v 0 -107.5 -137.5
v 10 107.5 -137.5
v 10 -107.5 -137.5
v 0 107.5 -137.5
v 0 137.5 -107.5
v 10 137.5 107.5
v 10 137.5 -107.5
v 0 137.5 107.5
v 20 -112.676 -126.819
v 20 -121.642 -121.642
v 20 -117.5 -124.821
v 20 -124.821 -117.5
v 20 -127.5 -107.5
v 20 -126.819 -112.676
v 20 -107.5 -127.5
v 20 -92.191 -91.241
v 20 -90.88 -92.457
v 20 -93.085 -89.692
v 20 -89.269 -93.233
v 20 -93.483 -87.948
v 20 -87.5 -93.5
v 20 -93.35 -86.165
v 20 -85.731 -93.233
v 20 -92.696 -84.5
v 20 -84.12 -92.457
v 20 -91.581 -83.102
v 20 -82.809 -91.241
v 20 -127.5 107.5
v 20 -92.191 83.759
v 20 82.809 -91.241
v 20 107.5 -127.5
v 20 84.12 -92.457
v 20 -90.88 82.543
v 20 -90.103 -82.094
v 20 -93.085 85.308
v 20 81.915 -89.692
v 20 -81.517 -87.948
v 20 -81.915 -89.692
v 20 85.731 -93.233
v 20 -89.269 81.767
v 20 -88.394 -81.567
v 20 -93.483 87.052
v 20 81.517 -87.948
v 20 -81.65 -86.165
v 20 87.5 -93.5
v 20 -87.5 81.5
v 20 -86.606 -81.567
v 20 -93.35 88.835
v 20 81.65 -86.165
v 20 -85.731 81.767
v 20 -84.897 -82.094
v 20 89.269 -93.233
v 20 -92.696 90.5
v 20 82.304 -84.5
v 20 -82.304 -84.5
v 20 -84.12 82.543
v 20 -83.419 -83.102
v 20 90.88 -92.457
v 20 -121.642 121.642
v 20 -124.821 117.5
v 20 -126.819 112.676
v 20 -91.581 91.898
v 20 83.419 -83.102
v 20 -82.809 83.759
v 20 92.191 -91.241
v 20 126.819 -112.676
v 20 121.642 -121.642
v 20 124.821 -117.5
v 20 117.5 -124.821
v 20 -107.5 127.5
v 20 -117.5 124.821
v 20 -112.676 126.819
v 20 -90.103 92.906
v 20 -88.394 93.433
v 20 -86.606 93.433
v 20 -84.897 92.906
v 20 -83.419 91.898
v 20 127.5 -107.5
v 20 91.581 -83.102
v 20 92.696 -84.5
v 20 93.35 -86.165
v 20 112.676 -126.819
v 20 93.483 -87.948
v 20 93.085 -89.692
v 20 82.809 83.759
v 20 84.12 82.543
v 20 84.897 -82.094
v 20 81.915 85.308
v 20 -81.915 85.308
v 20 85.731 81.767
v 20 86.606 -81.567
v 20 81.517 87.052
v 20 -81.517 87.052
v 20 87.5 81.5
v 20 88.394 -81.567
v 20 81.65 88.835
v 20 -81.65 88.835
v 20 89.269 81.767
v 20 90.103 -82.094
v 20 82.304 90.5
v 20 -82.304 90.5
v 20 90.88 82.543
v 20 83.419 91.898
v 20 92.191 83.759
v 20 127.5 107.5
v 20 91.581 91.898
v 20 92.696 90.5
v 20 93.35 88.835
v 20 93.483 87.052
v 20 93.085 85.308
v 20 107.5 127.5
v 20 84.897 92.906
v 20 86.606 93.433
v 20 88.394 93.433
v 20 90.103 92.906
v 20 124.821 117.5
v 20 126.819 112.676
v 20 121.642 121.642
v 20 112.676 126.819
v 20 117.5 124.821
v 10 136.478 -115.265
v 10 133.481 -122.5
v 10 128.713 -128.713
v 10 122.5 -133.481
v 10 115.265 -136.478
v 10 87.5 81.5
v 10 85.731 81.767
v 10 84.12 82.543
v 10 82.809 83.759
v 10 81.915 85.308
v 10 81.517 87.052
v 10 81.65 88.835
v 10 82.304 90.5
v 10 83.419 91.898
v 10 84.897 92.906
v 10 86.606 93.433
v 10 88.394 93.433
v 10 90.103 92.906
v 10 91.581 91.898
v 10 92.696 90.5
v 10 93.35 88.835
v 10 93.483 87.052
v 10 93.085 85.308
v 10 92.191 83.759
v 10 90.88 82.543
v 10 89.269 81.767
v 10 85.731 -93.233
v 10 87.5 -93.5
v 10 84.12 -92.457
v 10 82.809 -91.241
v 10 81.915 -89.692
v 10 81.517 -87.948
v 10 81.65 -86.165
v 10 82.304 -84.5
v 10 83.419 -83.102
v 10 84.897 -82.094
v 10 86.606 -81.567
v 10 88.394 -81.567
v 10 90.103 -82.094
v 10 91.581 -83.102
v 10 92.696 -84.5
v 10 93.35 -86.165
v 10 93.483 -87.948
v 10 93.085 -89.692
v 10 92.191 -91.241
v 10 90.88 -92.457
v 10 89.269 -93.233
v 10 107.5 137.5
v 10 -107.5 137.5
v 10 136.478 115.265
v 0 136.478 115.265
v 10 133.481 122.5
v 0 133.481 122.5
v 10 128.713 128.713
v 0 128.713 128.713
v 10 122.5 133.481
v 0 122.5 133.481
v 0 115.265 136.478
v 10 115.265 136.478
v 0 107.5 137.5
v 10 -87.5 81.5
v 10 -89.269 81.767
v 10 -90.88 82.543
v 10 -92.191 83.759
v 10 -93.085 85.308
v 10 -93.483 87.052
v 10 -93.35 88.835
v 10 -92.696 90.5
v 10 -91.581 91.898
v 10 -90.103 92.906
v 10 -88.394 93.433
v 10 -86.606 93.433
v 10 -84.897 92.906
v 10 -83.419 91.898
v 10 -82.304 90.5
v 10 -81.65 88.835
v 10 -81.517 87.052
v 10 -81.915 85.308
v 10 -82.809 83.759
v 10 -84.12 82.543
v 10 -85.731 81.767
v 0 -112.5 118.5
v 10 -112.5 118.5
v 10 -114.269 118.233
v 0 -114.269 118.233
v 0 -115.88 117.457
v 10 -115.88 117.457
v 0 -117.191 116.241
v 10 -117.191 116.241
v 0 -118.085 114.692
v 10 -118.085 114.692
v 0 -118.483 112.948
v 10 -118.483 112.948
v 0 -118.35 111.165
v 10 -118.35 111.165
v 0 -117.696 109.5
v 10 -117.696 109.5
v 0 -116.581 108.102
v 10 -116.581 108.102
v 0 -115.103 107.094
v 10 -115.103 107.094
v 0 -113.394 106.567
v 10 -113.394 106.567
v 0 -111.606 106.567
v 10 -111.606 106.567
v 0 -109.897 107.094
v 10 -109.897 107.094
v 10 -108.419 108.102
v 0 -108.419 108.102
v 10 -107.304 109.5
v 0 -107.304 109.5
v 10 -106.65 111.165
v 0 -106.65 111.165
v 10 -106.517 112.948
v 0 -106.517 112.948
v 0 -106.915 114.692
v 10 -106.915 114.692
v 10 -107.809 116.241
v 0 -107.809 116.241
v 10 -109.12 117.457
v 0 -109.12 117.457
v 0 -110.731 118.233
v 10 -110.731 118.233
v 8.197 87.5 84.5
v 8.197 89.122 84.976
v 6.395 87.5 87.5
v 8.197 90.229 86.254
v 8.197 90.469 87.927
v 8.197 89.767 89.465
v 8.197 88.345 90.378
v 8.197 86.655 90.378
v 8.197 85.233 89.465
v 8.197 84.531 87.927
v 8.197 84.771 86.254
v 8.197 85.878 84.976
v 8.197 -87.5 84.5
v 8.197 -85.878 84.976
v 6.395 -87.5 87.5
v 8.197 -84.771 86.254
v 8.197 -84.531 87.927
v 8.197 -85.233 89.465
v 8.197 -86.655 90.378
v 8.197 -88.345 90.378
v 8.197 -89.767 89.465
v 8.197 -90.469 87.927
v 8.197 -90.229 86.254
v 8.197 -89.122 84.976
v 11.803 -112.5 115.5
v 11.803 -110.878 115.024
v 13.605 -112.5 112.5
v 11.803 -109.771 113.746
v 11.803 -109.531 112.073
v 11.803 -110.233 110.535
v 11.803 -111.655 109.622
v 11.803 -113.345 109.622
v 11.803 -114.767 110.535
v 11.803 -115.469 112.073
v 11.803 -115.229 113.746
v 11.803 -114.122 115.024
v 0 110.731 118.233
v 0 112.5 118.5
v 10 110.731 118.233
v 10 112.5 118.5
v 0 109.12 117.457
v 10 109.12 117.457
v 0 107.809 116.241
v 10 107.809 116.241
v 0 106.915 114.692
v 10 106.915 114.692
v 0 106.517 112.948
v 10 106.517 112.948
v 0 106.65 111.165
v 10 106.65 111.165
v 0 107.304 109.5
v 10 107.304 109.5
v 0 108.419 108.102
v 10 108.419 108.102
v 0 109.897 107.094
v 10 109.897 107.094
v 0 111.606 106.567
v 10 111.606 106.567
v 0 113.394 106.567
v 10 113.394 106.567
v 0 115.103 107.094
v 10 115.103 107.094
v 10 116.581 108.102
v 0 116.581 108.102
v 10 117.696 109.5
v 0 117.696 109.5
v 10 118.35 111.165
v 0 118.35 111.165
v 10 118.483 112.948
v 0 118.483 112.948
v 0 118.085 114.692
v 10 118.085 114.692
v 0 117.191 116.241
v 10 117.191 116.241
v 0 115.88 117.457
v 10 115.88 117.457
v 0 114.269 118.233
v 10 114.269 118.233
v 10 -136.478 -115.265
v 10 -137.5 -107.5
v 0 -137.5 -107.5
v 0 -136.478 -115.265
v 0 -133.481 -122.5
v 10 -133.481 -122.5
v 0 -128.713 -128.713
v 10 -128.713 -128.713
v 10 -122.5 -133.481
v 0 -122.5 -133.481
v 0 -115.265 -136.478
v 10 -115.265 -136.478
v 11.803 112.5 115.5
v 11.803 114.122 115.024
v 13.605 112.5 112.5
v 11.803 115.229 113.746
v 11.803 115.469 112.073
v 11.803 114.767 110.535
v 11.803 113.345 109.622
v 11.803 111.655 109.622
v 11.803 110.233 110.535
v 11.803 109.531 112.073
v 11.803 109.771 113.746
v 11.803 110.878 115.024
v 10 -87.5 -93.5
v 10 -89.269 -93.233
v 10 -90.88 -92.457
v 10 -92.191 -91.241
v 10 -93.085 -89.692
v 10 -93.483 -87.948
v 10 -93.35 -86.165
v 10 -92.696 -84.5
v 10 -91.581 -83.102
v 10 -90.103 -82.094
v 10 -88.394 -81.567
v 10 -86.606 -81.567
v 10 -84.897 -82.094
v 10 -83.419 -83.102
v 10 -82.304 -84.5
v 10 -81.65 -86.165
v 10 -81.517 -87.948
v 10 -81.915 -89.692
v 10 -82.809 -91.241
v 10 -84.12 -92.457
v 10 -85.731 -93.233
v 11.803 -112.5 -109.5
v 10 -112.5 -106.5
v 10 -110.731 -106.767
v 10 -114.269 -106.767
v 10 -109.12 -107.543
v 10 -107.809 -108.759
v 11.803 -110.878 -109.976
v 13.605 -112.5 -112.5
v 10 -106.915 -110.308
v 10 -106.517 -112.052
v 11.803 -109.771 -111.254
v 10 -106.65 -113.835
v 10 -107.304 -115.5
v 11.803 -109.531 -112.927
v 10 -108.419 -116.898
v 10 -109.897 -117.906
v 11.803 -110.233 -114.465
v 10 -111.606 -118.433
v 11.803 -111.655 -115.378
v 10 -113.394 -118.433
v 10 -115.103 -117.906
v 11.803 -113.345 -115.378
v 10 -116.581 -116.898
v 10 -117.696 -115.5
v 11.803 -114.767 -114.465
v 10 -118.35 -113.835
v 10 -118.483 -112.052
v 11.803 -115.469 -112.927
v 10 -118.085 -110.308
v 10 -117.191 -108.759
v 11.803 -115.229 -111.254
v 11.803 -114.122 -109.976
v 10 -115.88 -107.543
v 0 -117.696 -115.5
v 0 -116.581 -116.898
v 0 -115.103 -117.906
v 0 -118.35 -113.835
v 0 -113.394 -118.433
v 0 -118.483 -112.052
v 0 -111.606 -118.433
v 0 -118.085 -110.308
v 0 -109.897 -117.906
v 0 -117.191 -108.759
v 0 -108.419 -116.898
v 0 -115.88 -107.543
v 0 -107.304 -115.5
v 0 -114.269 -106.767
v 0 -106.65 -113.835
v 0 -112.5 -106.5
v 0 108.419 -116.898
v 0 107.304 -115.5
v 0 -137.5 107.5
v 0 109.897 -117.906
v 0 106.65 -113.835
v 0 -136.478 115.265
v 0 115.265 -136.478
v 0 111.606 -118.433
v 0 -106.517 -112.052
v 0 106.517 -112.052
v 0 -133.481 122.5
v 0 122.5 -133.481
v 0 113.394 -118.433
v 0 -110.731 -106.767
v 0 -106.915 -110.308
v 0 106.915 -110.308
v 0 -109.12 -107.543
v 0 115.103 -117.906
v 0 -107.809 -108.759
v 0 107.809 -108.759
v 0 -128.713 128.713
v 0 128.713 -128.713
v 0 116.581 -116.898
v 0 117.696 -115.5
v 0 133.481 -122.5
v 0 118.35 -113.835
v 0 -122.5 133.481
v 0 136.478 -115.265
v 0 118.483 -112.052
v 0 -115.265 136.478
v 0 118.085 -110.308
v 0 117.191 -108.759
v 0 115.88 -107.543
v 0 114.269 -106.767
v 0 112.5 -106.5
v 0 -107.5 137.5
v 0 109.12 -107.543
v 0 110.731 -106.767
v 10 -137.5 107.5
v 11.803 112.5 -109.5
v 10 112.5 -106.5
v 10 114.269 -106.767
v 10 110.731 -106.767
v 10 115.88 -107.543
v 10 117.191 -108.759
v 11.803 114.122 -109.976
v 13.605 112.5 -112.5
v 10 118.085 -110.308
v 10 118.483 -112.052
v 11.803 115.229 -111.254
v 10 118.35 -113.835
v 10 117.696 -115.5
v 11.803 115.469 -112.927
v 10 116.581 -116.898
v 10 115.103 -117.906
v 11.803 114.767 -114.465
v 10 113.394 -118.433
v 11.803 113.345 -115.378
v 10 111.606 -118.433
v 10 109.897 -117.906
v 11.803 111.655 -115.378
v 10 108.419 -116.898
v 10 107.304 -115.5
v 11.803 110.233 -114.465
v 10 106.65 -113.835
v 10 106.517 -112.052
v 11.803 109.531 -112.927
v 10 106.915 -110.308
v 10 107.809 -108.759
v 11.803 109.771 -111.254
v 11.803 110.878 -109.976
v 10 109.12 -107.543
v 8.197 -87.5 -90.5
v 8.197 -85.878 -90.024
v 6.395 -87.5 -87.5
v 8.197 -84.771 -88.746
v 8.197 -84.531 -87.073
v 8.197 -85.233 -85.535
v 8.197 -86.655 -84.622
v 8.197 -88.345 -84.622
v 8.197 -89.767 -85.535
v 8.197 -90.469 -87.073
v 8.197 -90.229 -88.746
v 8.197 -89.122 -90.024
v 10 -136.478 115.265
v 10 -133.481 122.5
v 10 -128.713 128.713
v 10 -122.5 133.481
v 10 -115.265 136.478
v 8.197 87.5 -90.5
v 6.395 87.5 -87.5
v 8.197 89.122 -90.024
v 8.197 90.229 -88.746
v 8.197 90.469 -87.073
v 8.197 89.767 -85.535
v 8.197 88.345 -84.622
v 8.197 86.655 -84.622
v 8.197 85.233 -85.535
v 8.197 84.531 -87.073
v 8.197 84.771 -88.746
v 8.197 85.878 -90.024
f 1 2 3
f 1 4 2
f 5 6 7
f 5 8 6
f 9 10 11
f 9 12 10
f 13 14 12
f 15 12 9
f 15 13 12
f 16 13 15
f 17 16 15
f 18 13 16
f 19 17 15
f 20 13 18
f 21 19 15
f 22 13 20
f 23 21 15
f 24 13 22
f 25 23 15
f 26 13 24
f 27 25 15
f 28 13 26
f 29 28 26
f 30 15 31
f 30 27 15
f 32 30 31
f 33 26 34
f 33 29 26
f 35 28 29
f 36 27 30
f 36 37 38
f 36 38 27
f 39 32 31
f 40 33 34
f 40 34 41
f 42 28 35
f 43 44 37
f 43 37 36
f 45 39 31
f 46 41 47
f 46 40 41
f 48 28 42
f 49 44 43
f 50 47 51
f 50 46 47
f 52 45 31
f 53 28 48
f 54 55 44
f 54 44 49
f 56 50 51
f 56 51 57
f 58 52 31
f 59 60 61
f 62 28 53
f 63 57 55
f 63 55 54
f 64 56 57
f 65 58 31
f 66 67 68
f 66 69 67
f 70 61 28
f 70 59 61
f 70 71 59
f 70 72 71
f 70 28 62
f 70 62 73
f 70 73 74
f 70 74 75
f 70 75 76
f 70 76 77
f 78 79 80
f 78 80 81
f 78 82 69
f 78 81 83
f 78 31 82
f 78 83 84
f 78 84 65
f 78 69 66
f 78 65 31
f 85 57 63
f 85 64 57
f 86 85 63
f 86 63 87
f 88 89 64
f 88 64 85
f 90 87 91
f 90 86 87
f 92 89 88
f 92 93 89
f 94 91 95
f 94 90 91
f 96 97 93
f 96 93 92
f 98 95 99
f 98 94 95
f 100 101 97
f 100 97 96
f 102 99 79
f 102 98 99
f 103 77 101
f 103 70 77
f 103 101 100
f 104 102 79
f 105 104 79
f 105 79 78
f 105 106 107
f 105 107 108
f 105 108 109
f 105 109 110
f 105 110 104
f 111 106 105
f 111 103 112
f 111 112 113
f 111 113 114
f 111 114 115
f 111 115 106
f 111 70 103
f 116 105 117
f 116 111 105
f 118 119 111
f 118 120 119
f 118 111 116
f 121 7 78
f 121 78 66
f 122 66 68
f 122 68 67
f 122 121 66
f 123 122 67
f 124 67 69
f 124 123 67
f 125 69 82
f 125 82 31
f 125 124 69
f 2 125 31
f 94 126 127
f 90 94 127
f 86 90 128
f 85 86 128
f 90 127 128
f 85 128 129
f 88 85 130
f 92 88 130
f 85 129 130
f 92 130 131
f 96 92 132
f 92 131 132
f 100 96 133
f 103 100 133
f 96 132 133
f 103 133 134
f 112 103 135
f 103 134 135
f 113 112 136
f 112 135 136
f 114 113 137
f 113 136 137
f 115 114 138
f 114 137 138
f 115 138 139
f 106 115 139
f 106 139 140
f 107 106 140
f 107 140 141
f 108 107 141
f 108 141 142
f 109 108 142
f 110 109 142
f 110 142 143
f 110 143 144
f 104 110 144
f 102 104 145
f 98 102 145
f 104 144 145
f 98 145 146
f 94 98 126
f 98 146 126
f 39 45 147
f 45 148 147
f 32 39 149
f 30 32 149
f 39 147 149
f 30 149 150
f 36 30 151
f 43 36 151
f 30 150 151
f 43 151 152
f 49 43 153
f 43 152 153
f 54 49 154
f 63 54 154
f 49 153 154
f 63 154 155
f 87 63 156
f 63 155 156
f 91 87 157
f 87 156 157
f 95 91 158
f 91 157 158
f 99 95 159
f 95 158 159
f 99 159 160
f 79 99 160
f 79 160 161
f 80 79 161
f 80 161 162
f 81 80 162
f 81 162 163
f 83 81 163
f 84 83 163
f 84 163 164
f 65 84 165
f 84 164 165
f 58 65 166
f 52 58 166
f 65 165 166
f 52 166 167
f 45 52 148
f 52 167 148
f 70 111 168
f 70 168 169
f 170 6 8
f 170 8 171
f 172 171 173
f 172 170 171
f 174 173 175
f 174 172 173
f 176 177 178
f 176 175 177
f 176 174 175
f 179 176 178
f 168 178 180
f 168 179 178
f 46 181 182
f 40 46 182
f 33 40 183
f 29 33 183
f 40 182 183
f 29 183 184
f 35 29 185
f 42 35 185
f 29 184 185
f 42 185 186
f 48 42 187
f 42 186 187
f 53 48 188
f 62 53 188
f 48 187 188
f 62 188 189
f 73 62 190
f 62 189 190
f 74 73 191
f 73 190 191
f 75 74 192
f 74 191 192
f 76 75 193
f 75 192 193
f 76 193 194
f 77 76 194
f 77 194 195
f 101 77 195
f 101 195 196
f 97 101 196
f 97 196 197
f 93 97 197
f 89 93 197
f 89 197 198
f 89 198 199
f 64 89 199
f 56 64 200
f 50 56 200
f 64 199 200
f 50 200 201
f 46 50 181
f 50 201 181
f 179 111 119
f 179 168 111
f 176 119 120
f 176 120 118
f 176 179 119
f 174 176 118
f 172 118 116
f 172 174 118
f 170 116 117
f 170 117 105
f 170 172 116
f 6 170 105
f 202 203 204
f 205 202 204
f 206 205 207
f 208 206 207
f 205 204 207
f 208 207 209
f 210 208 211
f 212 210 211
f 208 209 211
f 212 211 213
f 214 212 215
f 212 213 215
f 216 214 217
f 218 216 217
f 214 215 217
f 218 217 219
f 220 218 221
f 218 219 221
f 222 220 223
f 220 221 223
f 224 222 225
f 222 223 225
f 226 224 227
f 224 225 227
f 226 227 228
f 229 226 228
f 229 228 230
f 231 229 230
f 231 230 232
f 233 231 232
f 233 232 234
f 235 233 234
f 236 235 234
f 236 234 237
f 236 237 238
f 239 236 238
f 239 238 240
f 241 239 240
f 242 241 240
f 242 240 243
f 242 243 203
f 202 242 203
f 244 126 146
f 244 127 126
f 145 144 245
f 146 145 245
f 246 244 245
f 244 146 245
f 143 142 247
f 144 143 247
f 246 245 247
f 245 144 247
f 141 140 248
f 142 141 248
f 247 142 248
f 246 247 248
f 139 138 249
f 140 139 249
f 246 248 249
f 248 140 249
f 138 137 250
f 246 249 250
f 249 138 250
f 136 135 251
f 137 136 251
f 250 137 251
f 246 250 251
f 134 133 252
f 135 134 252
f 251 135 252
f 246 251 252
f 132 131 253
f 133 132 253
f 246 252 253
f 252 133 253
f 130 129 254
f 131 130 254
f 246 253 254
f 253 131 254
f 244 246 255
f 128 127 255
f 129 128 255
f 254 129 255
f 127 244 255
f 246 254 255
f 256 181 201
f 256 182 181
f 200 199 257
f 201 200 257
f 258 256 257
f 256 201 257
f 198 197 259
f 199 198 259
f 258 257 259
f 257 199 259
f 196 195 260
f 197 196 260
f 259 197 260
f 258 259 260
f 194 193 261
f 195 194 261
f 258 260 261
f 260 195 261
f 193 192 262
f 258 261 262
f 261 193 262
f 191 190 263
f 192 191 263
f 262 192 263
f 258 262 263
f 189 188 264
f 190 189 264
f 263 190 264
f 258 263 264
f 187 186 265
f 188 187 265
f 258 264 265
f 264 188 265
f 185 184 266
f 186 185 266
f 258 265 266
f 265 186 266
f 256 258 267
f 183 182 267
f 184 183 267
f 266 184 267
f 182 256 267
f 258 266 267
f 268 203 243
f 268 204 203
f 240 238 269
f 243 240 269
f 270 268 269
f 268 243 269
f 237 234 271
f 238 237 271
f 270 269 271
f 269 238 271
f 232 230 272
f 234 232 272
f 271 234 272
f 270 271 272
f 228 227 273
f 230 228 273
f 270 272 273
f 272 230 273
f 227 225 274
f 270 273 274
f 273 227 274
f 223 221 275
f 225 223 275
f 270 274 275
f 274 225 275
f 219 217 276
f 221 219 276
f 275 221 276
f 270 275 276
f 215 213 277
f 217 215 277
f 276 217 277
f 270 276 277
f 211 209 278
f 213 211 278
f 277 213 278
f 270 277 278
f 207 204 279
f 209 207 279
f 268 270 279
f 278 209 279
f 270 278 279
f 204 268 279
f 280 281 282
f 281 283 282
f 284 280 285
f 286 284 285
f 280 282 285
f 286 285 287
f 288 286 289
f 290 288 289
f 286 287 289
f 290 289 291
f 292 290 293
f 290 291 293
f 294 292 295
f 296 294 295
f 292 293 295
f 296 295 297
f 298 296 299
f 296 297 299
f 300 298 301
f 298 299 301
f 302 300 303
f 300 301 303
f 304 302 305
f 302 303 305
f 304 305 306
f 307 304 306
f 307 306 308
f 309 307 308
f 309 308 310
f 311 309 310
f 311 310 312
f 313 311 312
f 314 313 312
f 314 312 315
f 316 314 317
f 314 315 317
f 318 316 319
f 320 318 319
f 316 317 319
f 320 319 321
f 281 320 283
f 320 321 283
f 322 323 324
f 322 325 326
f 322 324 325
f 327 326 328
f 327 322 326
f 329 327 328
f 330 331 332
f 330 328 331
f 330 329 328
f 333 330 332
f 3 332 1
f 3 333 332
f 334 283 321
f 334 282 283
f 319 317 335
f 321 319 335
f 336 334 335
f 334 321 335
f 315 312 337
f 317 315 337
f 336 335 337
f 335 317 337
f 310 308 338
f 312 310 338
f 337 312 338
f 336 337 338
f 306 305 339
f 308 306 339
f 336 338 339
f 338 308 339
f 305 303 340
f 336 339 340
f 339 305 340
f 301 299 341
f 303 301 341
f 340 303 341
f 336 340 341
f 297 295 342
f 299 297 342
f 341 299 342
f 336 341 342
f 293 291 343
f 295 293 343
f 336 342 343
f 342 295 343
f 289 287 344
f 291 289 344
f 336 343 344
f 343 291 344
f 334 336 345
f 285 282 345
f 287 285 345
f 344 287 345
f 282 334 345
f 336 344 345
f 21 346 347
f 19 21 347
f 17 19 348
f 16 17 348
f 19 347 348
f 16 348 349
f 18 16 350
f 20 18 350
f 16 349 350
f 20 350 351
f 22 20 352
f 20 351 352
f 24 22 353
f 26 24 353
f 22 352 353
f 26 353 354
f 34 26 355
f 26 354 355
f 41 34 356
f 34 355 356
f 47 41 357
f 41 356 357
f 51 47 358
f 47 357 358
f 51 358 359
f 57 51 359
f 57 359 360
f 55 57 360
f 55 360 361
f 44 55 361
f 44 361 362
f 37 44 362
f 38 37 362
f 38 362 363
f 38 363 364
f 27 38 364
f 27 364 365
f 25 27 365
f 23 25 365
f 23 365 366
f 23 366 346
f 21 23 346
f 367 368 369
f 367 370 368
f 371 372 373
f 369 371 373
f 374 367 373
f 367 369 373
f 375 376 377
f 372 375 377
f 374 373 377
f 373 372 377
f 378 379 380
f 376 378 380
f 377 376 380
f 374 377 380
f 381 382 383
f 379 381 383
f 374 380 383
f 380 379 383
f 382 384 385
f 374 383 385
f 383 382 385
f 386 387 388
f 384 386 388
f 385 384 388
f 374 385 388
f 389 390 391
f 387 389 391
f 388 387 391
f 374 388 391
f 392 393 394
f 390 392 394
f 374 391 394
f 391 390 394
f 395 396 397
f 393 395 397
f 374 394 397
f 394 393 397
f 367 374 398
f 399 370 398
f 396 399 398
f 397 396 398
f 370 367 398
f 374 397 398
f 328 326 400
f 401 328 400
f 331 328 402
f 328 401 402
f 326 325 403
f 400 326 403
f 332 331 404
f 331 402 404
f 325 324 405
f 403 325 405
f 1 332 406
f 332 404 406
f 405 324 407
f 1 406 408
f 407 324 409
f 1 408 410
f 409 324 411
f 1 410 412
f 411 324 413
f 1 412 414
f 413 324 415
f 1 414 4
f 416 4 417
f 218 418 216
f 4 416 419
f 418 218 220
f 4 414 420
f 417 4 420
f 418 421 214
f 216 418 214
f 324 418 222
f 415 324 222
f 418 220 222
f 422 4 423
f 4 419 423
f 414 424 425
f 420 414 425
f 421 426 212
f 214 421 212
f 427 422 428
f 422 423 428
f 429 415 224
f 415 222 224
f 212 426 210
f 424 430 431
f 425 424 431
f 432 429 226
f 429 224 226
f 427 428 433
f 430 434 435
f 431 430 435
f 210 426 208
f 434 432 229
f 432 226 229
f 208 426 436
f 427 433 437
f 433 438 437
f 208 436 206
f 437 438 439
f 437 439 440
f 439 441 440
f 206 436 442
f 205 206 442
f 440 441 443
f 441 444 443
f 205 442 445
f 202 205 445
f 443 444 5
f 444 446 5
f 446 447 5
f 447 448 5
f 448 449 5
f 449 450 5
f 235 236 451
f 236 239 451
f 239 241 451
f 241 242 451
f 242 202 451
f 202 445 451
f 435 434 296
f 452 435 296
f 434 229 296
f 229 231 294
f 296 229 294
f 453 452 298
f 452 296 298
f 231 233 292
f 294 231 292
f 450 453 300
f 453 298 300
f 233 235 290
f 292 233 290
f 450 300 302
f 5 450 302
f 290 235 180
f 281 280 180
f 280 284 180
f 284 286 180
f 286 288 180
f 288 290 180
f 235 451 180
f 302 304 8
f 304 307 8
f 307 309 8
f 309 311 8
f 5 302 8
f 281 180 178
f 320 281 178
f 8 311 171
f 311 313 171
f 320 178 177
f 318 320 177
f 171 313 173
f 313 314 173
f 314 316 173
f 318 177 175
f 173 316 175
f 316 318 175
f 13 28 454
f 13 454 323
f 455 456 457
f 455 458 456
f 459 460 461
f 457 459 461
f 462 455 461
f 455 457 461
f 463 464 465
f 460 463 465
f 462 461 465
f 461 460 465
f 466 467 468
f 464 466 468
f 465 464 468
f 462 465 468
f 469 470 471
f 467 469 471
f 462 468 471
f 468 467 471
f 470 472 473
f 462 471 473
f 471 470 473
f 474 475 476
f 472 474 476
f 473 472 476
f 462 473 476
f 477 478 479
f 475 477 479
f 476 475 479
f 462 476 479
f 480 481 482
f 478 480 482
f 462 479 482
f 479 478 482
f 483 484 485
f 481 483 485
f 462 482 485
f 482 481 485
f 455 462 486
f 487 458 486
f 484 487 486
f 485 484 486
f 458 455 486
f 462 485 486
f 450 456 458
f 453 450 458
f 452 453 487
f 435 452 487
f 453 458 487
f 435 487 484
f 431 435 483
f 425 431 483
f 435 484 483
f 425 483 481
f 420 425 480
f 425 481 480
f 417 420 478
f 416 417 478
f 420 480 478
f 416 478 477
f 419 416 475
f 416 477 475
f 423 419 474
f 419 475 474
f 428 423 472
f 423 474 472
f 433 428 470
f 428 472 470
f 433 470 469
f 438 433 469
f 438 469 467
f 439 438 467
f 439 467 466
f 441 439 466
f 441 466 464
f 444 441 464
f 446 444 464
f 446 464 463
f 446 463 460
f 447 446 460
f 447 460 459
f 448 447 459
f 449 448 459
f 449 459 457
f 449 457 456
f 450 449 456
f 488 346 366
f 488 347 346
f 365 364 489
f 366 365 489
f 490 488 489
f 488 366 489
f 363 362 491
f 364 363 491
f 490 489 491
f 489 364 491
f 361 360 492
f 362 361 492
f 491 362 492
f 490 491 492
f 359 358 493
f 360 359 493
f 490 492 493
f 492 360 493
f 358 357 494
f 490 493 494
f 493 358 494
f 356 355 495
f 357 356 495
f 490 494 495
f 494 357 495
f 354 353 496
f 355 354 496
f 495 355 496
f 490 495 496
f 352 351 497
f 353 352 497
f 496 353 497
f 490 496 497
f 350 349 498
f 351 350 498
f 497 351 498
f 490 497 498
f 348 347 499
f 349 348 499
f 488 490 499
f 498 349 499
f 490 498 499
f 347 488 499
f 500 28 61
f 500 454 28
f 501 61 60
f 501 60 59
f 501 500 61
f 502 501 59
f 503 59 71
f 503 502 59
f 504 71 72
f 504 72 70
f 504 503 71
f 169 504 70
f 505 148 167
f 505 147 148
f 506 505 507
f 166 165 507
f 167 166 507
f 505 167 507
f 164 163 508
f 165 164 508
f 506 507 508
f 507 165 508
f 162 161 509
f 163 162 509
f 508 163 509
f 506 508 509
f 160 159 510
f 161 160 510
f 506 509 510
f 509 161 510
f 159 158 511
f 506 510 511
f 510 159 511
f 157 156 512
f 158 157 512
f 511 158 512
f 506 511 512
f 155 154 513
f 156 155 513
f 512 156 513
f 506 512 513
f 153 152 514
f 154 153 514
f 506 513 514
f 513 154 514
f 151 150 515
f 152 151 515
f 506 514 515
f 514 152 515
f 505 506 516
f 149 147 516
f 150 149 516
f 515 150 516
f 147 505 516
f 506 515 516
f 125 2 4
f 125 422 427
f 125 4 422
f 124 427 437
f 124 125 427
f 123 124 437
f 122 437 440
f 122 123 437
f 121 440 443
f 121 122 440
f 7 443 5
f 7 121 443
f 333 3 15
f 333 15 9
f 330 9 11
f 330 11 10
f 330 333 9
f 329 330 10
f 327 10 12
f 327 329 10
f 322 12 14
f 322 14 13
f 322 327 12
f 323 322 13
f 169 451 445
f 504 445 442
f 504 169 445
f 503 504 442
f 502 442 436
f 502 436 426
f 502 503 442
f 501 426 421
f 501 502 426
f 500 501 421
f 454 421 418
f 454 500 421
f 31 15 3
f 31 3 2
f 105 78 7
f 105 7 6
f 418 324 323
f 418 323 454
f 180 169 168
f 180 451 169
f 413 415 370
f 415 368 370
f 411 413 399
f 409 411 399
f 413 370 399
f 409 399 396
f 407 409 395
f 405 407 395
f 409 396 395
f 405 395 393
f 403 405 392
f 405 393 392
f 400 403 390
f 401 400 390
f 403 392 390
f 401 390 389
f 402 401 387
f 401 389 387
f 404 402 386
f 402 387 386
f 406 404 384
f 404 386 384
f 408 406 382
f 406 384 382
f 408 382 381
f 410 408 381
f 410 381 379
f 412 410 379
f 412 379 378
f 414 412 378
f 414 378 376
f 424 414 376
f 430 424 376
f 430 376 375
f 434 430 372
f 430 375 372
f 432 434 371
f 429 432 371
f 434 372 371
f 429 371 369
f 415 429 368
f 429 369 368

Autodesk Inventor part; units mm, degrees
ref_plane "YZ Plane" through (0, 0, 0) normal (1, 0, 0) x (0, 1, 0)
ref_plane "XZ Plane" through (0, 0, 0) normal (0, 1, 0) x (-1, 0, 0)
ref_plane "XY Plane" through (0, 0, 0) normal (0, 0, 1) x (1, 0, 0)
sketch "草圖1" plane through (0, 0, 0) normal (1, 0, 0) x (0, 1, 0)
  line L0 (-137.5, 137.5) -> (137.5, 137.5)
  line L1 (137.5, 137.5) -> (137.5, -137.5)
  line L2 (137.5, -137.5) -> (-137.5, -137.5)
  line L3 (-137.5, -137.5) -> (-137.5, 137.5)
  line L4 (-137.5, 137.5) -> (137.5, -137.5) construction
  line L5 (137.5, 137.5) -> (-137.5, -137.5) construction
  point P0 (0, 0)
  dimension "d0" = 275
  dimension "d1" = 275
extrude "擠出1" add sketch "草圖1" along normal blind 20
fillet "圓角1" radius 30 4 edges at (10, 137.5, 137.5) (10, -137.5, 137.5) (10, 137.5, -137.5) (10, -137.5, -137.5)
chamfer "倒角1" distance 10 angle 45 8 edges at (20, 0, 137.5) (20, -128.7132, 128.7132) (20, -137.5, 0) (20, -128.7132, -128.7132) (20, 0, -137.5) (20, 128.7132, -128.7132) (20, 137.5, 0) (20, 128.7132, 128.7132)
sketch "草圖2" plane through (20, 0, 0) normal (1, 0, 0) x (0, 0, -1)
  line L0 (-87.5, -87.5) -> (87.5, -87.5)
  line L1 (87.5, -87.5) -> (87.5, 87.5)
  line L2 (87.5, 87.5) -> (-87.5, 87.5)
  line L3 (-87.5, 87.5) -> (-87.5, -87.5)
  line L4 (-87.5, -87.5) -> (87.5, 87.5) construction
  line L5 (87.5, -87.5) -> (-87.5, 87.5) construction
  point P0 (0, 0)
  dimension "d8" = 175
  dimension "d9" = 175
hole "孔1" at (20, 87.5, 87.5) at (20, 87.5, -87.5) at (20, -87.5, 87.5) at (20, -87.5, -87.5) direction (-1, 0, 0) diameter 12 depth 10 tip angle 118
sketch "草圖3" plane through (0, 0, 0) normal (-1, 0, 0) x (0, 0, 1)
  arc A0 (-137.5, -107.5) -> (-107.5, -137.5) centre (-107.5, -107.5) ccw projected
  line L0 (-107.5, -137.5) -> (107.5, -137.5) projected
  arc A1 (107.5, -137.5) -> (137.5, -107.5) centre (107.5, -107.5) ccw projected
  line L1 (137.5, -107.5) -> (137.5, 107.5) projected
  arc A2 (137.5, 107.5) -> (107.5, 137.5) centre (107.5, 107.5) ccw projected
  line L2 (107.5, 137.5) -> (-107.5, 137.5) projected
  arc A3 (-107.5, 137.5) -> (-137.5, 107.5) centre (-107.5, 107.5) ccw projected
  line L3 (-137.5, 107.5) -> (-137.5, -107.5) projected
  line L4 (112.5, 112.5) -> (-112.5, 112.5)
  line L5 (-112.5, 112.5) -> (-112.5, -112.5)
  line L6 (-112.5, -112.5) -> (112.5, -112.5)
  line L7 (112.5, -112.5) -> (112.5, 112.5)
  line L8 (112.5, 112.5) -> (-112.5, -112.5) construction
  line L9 (-112.5, 112.5) -> (112.5, -112.5) construction
  point P0 (0, 0)
  dimension "d17" = 225
  dimension "d18" = 225
hole "孔2" at (0, -112.5, 112.5) at (0, -112.5, -112.5) at (0, 112.5, -112.5) at (0, 112.5, 112.5) direction (1, 0, 0) diameter 12 depth 10 tip angle 118
properties part number "exercise3-1-2"
